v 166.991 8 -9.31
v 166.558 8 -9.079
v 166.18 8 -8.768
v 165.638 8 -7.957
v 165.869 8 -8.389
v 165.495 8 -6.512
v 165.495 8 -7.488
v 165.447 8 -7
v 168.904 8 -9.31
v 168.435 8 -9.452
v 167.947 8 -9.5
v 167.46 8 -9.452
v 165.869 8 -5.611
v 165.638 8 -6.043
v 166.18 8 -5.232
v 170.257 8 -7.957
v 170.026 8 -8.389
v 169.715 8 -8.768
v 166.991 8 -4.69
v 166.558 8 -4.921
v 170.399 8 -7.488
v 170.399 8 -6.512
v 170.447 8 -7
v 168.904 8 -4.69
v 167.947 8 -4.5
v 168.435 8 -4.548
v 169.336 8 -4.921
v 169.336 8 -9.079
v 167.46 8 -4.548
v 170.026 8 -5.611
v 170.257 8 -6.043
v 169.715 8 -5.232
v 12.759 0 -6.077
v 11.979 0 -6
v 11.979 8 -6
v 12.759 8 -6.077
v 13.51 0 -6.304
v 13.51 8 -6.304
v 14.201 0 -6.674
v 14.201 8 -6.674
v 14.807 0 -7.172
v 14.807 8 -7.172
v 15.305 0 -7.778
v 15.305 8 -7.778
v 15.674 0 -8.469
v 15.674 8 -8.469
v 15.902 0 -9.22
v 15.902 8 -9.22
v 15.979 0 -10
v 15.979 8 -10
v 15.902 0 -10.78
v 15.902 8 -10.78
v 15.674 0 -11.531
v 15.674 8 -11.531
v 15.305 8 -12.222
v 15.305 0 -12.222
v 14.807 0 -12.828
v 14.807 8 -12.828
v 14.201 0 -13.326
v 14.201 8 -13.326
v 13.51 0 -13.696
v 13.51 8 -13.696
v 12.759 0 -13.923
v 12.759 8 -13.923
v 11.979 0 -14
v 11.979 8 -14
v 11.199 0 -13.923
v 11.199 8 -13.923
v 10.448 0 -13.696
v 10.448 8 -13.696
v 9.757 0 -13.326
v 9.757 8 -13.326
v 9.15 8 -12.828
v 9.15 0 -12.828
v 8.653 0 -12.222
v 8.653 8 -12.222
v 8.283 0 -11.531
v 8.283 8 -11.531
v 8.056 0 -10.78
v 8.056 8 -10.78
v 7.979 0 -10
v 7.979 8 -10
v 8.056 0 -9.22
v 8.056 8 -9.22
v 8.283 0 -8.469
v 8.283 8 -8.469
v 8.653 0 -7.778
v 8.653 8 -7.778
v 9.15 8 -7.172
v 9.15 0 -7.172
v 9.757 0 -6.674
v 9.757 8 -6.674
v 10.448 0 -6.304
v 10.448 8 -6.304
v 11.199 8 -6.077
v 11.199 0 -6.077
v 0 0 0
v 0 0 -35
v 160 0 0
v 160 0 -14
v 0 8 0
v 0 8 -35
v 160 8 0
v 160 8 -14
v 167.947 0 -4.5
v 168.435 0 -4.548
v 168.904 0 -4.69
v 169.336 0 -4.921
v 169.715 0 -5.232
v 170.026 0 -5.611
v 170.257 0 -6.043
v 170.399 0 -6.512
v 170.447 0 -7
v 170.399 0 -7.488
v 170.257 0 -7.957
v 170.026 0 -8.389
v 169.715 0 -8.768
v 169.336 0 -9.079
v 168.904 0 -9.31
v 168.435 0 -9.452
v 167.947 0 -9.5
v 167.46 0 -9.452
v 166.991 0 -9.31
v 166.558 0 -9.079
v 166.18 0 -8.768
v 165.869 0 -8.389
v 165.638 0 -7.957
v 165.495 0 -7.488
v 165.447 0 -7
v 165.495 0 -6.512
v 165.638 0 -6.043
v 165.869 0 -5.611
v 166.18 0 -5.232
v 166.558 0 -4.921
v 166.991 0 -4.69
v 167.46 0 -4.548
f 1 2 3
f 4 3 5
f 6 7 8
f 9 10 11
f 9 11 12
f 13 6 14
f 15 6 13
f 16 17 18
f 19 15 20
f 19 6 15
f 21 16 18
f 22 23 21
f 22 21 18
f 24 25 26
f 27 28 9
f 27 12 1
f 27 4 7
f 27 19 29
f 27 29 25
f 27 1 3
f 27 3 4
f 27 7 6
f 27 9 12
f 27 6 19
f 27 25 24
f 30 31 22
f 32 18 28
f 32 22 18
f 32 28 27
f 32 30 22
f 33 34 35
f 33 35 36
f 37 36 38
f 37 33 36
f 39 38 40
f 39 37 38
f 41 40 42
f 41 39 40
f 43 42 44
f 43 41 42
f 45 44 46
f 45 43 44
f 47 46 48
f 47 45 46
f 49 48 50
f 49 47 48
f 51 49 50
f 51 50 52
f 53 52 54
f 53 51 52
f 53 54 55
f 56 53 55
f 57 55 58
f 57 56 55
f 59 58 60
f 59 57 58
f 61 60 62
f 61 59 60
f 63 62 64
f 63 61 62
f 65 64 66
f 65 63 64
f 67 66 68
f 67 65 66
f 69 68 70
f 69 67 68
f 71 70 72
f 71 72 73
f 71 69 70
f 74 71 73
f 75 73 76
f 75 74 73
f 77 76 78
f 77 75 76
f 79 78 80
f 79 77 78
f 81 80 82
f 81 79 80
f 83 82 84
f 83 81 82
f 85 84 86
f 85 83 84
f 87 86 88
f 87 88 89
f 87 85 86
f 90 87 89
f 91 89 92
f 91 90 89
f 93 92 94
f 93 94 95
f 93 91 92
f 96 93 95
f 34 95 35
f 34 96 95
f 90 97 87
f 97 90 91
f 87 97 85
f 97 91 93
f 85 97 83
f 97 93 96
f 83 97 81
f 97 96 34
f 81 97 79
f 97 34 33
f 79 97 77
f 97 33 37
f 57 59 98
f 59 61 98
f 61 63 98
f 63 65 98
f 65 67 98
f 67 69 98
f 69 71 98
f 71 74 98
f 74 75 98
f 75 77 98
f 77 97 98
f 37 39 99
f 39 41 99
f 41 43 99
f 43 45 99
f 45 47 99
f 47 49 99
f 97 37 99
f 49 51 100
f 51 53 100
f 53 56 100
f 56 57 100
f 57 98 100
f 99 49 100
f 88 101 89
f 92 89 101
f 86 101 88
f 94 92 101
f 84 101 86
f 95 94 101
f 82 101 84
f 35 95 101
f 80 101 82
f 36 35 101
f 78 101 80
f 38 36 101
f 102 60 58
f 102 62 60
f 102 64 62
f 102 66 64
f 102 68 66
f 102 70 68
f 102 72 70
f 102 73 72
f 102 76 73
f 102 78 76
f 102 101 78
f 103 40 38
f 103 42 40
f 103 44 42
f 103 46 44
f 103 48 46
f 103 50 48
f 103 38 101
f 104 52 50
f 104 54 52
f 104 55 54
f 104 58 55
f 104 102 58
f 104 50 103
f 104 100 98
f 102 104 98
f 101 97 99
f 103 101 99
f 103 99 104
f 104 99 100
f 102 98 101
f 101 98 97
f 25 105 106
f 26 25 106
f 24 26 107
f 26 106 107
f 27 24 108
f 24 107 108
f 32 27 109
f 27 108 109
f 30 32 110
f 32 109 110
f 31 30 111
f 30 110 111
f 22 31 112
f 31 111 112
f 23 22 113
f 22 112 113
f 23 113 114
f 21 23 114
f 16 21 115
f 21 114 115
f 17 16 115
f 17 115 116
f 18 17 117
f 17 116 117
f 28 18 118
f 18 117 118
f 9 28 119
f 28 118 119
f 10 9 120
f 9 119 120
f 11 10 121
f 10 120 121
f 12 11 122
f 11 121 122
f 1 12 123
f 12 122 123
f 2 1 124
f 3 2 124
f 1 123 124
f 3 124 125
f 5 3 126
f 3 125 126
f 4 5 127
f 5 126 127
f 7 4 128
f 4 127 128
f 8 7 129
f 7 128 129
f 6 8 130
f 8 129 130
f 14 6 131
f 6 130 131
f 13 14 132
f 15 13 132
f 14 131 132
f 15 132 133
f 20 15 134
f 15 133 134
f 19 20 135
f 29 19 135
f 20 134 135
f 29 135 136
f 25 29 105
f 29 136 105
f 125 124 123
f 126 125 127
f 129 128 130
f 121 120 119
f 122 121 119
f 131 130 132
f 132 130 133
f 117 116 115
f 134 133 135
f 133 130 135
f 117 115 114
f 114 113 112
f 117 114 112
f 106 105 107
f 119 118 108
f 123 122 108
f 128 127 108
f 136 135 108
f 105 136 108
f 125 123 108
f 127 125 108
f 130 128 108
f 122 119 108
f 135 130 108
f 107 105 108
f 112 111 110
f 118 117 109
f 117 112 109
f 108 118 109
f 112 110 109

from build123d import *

# Parameters (mm, degrees)
SKETCH1_R             = 2.5
BOSS_EXTRUDE1_DEPTH   = 8
SKETCH1_R_2           = 4
BOSS_EXTRUDE1_2_DEPTH = 8


with BuildPart() as part:
    # Sketch1 → Boss-Extrude1 (new body)
    with BuildSketch(Plane(origin=(0, 0, 0), x_dir=(1, 0, 0), z_dir=(0, 1, 0))):
        with Locations(Location((167.947390468, 7, 0), (0, 0, 270))):
            Circle(SKETCH1_R)
    extrude(amount=BOSS_EXTRUDE1_DEPTH)


with BuildPart() as body_2:
    # Sketch1 → Boss-Extrude1 2 (new body)
    with BuildSketch(Plane(origin=(0, 0, 0), x_dir=(1, 0, 0), z_dir=(0, 1, 0))):
        Polygon((0, 0), (160, 0), (160, 14), (0, 35), align=None)
        with Locations(Location((11.978896163, 10, 0), (0, 0, 270))):
            Circle(SKETCH1_R_2, mode=Mode.SUBTRACT)
    extrude(amount=BOSS_EXTRUDE1_2_DEPTH)


solid = Compound([part.part, body_2.part])
